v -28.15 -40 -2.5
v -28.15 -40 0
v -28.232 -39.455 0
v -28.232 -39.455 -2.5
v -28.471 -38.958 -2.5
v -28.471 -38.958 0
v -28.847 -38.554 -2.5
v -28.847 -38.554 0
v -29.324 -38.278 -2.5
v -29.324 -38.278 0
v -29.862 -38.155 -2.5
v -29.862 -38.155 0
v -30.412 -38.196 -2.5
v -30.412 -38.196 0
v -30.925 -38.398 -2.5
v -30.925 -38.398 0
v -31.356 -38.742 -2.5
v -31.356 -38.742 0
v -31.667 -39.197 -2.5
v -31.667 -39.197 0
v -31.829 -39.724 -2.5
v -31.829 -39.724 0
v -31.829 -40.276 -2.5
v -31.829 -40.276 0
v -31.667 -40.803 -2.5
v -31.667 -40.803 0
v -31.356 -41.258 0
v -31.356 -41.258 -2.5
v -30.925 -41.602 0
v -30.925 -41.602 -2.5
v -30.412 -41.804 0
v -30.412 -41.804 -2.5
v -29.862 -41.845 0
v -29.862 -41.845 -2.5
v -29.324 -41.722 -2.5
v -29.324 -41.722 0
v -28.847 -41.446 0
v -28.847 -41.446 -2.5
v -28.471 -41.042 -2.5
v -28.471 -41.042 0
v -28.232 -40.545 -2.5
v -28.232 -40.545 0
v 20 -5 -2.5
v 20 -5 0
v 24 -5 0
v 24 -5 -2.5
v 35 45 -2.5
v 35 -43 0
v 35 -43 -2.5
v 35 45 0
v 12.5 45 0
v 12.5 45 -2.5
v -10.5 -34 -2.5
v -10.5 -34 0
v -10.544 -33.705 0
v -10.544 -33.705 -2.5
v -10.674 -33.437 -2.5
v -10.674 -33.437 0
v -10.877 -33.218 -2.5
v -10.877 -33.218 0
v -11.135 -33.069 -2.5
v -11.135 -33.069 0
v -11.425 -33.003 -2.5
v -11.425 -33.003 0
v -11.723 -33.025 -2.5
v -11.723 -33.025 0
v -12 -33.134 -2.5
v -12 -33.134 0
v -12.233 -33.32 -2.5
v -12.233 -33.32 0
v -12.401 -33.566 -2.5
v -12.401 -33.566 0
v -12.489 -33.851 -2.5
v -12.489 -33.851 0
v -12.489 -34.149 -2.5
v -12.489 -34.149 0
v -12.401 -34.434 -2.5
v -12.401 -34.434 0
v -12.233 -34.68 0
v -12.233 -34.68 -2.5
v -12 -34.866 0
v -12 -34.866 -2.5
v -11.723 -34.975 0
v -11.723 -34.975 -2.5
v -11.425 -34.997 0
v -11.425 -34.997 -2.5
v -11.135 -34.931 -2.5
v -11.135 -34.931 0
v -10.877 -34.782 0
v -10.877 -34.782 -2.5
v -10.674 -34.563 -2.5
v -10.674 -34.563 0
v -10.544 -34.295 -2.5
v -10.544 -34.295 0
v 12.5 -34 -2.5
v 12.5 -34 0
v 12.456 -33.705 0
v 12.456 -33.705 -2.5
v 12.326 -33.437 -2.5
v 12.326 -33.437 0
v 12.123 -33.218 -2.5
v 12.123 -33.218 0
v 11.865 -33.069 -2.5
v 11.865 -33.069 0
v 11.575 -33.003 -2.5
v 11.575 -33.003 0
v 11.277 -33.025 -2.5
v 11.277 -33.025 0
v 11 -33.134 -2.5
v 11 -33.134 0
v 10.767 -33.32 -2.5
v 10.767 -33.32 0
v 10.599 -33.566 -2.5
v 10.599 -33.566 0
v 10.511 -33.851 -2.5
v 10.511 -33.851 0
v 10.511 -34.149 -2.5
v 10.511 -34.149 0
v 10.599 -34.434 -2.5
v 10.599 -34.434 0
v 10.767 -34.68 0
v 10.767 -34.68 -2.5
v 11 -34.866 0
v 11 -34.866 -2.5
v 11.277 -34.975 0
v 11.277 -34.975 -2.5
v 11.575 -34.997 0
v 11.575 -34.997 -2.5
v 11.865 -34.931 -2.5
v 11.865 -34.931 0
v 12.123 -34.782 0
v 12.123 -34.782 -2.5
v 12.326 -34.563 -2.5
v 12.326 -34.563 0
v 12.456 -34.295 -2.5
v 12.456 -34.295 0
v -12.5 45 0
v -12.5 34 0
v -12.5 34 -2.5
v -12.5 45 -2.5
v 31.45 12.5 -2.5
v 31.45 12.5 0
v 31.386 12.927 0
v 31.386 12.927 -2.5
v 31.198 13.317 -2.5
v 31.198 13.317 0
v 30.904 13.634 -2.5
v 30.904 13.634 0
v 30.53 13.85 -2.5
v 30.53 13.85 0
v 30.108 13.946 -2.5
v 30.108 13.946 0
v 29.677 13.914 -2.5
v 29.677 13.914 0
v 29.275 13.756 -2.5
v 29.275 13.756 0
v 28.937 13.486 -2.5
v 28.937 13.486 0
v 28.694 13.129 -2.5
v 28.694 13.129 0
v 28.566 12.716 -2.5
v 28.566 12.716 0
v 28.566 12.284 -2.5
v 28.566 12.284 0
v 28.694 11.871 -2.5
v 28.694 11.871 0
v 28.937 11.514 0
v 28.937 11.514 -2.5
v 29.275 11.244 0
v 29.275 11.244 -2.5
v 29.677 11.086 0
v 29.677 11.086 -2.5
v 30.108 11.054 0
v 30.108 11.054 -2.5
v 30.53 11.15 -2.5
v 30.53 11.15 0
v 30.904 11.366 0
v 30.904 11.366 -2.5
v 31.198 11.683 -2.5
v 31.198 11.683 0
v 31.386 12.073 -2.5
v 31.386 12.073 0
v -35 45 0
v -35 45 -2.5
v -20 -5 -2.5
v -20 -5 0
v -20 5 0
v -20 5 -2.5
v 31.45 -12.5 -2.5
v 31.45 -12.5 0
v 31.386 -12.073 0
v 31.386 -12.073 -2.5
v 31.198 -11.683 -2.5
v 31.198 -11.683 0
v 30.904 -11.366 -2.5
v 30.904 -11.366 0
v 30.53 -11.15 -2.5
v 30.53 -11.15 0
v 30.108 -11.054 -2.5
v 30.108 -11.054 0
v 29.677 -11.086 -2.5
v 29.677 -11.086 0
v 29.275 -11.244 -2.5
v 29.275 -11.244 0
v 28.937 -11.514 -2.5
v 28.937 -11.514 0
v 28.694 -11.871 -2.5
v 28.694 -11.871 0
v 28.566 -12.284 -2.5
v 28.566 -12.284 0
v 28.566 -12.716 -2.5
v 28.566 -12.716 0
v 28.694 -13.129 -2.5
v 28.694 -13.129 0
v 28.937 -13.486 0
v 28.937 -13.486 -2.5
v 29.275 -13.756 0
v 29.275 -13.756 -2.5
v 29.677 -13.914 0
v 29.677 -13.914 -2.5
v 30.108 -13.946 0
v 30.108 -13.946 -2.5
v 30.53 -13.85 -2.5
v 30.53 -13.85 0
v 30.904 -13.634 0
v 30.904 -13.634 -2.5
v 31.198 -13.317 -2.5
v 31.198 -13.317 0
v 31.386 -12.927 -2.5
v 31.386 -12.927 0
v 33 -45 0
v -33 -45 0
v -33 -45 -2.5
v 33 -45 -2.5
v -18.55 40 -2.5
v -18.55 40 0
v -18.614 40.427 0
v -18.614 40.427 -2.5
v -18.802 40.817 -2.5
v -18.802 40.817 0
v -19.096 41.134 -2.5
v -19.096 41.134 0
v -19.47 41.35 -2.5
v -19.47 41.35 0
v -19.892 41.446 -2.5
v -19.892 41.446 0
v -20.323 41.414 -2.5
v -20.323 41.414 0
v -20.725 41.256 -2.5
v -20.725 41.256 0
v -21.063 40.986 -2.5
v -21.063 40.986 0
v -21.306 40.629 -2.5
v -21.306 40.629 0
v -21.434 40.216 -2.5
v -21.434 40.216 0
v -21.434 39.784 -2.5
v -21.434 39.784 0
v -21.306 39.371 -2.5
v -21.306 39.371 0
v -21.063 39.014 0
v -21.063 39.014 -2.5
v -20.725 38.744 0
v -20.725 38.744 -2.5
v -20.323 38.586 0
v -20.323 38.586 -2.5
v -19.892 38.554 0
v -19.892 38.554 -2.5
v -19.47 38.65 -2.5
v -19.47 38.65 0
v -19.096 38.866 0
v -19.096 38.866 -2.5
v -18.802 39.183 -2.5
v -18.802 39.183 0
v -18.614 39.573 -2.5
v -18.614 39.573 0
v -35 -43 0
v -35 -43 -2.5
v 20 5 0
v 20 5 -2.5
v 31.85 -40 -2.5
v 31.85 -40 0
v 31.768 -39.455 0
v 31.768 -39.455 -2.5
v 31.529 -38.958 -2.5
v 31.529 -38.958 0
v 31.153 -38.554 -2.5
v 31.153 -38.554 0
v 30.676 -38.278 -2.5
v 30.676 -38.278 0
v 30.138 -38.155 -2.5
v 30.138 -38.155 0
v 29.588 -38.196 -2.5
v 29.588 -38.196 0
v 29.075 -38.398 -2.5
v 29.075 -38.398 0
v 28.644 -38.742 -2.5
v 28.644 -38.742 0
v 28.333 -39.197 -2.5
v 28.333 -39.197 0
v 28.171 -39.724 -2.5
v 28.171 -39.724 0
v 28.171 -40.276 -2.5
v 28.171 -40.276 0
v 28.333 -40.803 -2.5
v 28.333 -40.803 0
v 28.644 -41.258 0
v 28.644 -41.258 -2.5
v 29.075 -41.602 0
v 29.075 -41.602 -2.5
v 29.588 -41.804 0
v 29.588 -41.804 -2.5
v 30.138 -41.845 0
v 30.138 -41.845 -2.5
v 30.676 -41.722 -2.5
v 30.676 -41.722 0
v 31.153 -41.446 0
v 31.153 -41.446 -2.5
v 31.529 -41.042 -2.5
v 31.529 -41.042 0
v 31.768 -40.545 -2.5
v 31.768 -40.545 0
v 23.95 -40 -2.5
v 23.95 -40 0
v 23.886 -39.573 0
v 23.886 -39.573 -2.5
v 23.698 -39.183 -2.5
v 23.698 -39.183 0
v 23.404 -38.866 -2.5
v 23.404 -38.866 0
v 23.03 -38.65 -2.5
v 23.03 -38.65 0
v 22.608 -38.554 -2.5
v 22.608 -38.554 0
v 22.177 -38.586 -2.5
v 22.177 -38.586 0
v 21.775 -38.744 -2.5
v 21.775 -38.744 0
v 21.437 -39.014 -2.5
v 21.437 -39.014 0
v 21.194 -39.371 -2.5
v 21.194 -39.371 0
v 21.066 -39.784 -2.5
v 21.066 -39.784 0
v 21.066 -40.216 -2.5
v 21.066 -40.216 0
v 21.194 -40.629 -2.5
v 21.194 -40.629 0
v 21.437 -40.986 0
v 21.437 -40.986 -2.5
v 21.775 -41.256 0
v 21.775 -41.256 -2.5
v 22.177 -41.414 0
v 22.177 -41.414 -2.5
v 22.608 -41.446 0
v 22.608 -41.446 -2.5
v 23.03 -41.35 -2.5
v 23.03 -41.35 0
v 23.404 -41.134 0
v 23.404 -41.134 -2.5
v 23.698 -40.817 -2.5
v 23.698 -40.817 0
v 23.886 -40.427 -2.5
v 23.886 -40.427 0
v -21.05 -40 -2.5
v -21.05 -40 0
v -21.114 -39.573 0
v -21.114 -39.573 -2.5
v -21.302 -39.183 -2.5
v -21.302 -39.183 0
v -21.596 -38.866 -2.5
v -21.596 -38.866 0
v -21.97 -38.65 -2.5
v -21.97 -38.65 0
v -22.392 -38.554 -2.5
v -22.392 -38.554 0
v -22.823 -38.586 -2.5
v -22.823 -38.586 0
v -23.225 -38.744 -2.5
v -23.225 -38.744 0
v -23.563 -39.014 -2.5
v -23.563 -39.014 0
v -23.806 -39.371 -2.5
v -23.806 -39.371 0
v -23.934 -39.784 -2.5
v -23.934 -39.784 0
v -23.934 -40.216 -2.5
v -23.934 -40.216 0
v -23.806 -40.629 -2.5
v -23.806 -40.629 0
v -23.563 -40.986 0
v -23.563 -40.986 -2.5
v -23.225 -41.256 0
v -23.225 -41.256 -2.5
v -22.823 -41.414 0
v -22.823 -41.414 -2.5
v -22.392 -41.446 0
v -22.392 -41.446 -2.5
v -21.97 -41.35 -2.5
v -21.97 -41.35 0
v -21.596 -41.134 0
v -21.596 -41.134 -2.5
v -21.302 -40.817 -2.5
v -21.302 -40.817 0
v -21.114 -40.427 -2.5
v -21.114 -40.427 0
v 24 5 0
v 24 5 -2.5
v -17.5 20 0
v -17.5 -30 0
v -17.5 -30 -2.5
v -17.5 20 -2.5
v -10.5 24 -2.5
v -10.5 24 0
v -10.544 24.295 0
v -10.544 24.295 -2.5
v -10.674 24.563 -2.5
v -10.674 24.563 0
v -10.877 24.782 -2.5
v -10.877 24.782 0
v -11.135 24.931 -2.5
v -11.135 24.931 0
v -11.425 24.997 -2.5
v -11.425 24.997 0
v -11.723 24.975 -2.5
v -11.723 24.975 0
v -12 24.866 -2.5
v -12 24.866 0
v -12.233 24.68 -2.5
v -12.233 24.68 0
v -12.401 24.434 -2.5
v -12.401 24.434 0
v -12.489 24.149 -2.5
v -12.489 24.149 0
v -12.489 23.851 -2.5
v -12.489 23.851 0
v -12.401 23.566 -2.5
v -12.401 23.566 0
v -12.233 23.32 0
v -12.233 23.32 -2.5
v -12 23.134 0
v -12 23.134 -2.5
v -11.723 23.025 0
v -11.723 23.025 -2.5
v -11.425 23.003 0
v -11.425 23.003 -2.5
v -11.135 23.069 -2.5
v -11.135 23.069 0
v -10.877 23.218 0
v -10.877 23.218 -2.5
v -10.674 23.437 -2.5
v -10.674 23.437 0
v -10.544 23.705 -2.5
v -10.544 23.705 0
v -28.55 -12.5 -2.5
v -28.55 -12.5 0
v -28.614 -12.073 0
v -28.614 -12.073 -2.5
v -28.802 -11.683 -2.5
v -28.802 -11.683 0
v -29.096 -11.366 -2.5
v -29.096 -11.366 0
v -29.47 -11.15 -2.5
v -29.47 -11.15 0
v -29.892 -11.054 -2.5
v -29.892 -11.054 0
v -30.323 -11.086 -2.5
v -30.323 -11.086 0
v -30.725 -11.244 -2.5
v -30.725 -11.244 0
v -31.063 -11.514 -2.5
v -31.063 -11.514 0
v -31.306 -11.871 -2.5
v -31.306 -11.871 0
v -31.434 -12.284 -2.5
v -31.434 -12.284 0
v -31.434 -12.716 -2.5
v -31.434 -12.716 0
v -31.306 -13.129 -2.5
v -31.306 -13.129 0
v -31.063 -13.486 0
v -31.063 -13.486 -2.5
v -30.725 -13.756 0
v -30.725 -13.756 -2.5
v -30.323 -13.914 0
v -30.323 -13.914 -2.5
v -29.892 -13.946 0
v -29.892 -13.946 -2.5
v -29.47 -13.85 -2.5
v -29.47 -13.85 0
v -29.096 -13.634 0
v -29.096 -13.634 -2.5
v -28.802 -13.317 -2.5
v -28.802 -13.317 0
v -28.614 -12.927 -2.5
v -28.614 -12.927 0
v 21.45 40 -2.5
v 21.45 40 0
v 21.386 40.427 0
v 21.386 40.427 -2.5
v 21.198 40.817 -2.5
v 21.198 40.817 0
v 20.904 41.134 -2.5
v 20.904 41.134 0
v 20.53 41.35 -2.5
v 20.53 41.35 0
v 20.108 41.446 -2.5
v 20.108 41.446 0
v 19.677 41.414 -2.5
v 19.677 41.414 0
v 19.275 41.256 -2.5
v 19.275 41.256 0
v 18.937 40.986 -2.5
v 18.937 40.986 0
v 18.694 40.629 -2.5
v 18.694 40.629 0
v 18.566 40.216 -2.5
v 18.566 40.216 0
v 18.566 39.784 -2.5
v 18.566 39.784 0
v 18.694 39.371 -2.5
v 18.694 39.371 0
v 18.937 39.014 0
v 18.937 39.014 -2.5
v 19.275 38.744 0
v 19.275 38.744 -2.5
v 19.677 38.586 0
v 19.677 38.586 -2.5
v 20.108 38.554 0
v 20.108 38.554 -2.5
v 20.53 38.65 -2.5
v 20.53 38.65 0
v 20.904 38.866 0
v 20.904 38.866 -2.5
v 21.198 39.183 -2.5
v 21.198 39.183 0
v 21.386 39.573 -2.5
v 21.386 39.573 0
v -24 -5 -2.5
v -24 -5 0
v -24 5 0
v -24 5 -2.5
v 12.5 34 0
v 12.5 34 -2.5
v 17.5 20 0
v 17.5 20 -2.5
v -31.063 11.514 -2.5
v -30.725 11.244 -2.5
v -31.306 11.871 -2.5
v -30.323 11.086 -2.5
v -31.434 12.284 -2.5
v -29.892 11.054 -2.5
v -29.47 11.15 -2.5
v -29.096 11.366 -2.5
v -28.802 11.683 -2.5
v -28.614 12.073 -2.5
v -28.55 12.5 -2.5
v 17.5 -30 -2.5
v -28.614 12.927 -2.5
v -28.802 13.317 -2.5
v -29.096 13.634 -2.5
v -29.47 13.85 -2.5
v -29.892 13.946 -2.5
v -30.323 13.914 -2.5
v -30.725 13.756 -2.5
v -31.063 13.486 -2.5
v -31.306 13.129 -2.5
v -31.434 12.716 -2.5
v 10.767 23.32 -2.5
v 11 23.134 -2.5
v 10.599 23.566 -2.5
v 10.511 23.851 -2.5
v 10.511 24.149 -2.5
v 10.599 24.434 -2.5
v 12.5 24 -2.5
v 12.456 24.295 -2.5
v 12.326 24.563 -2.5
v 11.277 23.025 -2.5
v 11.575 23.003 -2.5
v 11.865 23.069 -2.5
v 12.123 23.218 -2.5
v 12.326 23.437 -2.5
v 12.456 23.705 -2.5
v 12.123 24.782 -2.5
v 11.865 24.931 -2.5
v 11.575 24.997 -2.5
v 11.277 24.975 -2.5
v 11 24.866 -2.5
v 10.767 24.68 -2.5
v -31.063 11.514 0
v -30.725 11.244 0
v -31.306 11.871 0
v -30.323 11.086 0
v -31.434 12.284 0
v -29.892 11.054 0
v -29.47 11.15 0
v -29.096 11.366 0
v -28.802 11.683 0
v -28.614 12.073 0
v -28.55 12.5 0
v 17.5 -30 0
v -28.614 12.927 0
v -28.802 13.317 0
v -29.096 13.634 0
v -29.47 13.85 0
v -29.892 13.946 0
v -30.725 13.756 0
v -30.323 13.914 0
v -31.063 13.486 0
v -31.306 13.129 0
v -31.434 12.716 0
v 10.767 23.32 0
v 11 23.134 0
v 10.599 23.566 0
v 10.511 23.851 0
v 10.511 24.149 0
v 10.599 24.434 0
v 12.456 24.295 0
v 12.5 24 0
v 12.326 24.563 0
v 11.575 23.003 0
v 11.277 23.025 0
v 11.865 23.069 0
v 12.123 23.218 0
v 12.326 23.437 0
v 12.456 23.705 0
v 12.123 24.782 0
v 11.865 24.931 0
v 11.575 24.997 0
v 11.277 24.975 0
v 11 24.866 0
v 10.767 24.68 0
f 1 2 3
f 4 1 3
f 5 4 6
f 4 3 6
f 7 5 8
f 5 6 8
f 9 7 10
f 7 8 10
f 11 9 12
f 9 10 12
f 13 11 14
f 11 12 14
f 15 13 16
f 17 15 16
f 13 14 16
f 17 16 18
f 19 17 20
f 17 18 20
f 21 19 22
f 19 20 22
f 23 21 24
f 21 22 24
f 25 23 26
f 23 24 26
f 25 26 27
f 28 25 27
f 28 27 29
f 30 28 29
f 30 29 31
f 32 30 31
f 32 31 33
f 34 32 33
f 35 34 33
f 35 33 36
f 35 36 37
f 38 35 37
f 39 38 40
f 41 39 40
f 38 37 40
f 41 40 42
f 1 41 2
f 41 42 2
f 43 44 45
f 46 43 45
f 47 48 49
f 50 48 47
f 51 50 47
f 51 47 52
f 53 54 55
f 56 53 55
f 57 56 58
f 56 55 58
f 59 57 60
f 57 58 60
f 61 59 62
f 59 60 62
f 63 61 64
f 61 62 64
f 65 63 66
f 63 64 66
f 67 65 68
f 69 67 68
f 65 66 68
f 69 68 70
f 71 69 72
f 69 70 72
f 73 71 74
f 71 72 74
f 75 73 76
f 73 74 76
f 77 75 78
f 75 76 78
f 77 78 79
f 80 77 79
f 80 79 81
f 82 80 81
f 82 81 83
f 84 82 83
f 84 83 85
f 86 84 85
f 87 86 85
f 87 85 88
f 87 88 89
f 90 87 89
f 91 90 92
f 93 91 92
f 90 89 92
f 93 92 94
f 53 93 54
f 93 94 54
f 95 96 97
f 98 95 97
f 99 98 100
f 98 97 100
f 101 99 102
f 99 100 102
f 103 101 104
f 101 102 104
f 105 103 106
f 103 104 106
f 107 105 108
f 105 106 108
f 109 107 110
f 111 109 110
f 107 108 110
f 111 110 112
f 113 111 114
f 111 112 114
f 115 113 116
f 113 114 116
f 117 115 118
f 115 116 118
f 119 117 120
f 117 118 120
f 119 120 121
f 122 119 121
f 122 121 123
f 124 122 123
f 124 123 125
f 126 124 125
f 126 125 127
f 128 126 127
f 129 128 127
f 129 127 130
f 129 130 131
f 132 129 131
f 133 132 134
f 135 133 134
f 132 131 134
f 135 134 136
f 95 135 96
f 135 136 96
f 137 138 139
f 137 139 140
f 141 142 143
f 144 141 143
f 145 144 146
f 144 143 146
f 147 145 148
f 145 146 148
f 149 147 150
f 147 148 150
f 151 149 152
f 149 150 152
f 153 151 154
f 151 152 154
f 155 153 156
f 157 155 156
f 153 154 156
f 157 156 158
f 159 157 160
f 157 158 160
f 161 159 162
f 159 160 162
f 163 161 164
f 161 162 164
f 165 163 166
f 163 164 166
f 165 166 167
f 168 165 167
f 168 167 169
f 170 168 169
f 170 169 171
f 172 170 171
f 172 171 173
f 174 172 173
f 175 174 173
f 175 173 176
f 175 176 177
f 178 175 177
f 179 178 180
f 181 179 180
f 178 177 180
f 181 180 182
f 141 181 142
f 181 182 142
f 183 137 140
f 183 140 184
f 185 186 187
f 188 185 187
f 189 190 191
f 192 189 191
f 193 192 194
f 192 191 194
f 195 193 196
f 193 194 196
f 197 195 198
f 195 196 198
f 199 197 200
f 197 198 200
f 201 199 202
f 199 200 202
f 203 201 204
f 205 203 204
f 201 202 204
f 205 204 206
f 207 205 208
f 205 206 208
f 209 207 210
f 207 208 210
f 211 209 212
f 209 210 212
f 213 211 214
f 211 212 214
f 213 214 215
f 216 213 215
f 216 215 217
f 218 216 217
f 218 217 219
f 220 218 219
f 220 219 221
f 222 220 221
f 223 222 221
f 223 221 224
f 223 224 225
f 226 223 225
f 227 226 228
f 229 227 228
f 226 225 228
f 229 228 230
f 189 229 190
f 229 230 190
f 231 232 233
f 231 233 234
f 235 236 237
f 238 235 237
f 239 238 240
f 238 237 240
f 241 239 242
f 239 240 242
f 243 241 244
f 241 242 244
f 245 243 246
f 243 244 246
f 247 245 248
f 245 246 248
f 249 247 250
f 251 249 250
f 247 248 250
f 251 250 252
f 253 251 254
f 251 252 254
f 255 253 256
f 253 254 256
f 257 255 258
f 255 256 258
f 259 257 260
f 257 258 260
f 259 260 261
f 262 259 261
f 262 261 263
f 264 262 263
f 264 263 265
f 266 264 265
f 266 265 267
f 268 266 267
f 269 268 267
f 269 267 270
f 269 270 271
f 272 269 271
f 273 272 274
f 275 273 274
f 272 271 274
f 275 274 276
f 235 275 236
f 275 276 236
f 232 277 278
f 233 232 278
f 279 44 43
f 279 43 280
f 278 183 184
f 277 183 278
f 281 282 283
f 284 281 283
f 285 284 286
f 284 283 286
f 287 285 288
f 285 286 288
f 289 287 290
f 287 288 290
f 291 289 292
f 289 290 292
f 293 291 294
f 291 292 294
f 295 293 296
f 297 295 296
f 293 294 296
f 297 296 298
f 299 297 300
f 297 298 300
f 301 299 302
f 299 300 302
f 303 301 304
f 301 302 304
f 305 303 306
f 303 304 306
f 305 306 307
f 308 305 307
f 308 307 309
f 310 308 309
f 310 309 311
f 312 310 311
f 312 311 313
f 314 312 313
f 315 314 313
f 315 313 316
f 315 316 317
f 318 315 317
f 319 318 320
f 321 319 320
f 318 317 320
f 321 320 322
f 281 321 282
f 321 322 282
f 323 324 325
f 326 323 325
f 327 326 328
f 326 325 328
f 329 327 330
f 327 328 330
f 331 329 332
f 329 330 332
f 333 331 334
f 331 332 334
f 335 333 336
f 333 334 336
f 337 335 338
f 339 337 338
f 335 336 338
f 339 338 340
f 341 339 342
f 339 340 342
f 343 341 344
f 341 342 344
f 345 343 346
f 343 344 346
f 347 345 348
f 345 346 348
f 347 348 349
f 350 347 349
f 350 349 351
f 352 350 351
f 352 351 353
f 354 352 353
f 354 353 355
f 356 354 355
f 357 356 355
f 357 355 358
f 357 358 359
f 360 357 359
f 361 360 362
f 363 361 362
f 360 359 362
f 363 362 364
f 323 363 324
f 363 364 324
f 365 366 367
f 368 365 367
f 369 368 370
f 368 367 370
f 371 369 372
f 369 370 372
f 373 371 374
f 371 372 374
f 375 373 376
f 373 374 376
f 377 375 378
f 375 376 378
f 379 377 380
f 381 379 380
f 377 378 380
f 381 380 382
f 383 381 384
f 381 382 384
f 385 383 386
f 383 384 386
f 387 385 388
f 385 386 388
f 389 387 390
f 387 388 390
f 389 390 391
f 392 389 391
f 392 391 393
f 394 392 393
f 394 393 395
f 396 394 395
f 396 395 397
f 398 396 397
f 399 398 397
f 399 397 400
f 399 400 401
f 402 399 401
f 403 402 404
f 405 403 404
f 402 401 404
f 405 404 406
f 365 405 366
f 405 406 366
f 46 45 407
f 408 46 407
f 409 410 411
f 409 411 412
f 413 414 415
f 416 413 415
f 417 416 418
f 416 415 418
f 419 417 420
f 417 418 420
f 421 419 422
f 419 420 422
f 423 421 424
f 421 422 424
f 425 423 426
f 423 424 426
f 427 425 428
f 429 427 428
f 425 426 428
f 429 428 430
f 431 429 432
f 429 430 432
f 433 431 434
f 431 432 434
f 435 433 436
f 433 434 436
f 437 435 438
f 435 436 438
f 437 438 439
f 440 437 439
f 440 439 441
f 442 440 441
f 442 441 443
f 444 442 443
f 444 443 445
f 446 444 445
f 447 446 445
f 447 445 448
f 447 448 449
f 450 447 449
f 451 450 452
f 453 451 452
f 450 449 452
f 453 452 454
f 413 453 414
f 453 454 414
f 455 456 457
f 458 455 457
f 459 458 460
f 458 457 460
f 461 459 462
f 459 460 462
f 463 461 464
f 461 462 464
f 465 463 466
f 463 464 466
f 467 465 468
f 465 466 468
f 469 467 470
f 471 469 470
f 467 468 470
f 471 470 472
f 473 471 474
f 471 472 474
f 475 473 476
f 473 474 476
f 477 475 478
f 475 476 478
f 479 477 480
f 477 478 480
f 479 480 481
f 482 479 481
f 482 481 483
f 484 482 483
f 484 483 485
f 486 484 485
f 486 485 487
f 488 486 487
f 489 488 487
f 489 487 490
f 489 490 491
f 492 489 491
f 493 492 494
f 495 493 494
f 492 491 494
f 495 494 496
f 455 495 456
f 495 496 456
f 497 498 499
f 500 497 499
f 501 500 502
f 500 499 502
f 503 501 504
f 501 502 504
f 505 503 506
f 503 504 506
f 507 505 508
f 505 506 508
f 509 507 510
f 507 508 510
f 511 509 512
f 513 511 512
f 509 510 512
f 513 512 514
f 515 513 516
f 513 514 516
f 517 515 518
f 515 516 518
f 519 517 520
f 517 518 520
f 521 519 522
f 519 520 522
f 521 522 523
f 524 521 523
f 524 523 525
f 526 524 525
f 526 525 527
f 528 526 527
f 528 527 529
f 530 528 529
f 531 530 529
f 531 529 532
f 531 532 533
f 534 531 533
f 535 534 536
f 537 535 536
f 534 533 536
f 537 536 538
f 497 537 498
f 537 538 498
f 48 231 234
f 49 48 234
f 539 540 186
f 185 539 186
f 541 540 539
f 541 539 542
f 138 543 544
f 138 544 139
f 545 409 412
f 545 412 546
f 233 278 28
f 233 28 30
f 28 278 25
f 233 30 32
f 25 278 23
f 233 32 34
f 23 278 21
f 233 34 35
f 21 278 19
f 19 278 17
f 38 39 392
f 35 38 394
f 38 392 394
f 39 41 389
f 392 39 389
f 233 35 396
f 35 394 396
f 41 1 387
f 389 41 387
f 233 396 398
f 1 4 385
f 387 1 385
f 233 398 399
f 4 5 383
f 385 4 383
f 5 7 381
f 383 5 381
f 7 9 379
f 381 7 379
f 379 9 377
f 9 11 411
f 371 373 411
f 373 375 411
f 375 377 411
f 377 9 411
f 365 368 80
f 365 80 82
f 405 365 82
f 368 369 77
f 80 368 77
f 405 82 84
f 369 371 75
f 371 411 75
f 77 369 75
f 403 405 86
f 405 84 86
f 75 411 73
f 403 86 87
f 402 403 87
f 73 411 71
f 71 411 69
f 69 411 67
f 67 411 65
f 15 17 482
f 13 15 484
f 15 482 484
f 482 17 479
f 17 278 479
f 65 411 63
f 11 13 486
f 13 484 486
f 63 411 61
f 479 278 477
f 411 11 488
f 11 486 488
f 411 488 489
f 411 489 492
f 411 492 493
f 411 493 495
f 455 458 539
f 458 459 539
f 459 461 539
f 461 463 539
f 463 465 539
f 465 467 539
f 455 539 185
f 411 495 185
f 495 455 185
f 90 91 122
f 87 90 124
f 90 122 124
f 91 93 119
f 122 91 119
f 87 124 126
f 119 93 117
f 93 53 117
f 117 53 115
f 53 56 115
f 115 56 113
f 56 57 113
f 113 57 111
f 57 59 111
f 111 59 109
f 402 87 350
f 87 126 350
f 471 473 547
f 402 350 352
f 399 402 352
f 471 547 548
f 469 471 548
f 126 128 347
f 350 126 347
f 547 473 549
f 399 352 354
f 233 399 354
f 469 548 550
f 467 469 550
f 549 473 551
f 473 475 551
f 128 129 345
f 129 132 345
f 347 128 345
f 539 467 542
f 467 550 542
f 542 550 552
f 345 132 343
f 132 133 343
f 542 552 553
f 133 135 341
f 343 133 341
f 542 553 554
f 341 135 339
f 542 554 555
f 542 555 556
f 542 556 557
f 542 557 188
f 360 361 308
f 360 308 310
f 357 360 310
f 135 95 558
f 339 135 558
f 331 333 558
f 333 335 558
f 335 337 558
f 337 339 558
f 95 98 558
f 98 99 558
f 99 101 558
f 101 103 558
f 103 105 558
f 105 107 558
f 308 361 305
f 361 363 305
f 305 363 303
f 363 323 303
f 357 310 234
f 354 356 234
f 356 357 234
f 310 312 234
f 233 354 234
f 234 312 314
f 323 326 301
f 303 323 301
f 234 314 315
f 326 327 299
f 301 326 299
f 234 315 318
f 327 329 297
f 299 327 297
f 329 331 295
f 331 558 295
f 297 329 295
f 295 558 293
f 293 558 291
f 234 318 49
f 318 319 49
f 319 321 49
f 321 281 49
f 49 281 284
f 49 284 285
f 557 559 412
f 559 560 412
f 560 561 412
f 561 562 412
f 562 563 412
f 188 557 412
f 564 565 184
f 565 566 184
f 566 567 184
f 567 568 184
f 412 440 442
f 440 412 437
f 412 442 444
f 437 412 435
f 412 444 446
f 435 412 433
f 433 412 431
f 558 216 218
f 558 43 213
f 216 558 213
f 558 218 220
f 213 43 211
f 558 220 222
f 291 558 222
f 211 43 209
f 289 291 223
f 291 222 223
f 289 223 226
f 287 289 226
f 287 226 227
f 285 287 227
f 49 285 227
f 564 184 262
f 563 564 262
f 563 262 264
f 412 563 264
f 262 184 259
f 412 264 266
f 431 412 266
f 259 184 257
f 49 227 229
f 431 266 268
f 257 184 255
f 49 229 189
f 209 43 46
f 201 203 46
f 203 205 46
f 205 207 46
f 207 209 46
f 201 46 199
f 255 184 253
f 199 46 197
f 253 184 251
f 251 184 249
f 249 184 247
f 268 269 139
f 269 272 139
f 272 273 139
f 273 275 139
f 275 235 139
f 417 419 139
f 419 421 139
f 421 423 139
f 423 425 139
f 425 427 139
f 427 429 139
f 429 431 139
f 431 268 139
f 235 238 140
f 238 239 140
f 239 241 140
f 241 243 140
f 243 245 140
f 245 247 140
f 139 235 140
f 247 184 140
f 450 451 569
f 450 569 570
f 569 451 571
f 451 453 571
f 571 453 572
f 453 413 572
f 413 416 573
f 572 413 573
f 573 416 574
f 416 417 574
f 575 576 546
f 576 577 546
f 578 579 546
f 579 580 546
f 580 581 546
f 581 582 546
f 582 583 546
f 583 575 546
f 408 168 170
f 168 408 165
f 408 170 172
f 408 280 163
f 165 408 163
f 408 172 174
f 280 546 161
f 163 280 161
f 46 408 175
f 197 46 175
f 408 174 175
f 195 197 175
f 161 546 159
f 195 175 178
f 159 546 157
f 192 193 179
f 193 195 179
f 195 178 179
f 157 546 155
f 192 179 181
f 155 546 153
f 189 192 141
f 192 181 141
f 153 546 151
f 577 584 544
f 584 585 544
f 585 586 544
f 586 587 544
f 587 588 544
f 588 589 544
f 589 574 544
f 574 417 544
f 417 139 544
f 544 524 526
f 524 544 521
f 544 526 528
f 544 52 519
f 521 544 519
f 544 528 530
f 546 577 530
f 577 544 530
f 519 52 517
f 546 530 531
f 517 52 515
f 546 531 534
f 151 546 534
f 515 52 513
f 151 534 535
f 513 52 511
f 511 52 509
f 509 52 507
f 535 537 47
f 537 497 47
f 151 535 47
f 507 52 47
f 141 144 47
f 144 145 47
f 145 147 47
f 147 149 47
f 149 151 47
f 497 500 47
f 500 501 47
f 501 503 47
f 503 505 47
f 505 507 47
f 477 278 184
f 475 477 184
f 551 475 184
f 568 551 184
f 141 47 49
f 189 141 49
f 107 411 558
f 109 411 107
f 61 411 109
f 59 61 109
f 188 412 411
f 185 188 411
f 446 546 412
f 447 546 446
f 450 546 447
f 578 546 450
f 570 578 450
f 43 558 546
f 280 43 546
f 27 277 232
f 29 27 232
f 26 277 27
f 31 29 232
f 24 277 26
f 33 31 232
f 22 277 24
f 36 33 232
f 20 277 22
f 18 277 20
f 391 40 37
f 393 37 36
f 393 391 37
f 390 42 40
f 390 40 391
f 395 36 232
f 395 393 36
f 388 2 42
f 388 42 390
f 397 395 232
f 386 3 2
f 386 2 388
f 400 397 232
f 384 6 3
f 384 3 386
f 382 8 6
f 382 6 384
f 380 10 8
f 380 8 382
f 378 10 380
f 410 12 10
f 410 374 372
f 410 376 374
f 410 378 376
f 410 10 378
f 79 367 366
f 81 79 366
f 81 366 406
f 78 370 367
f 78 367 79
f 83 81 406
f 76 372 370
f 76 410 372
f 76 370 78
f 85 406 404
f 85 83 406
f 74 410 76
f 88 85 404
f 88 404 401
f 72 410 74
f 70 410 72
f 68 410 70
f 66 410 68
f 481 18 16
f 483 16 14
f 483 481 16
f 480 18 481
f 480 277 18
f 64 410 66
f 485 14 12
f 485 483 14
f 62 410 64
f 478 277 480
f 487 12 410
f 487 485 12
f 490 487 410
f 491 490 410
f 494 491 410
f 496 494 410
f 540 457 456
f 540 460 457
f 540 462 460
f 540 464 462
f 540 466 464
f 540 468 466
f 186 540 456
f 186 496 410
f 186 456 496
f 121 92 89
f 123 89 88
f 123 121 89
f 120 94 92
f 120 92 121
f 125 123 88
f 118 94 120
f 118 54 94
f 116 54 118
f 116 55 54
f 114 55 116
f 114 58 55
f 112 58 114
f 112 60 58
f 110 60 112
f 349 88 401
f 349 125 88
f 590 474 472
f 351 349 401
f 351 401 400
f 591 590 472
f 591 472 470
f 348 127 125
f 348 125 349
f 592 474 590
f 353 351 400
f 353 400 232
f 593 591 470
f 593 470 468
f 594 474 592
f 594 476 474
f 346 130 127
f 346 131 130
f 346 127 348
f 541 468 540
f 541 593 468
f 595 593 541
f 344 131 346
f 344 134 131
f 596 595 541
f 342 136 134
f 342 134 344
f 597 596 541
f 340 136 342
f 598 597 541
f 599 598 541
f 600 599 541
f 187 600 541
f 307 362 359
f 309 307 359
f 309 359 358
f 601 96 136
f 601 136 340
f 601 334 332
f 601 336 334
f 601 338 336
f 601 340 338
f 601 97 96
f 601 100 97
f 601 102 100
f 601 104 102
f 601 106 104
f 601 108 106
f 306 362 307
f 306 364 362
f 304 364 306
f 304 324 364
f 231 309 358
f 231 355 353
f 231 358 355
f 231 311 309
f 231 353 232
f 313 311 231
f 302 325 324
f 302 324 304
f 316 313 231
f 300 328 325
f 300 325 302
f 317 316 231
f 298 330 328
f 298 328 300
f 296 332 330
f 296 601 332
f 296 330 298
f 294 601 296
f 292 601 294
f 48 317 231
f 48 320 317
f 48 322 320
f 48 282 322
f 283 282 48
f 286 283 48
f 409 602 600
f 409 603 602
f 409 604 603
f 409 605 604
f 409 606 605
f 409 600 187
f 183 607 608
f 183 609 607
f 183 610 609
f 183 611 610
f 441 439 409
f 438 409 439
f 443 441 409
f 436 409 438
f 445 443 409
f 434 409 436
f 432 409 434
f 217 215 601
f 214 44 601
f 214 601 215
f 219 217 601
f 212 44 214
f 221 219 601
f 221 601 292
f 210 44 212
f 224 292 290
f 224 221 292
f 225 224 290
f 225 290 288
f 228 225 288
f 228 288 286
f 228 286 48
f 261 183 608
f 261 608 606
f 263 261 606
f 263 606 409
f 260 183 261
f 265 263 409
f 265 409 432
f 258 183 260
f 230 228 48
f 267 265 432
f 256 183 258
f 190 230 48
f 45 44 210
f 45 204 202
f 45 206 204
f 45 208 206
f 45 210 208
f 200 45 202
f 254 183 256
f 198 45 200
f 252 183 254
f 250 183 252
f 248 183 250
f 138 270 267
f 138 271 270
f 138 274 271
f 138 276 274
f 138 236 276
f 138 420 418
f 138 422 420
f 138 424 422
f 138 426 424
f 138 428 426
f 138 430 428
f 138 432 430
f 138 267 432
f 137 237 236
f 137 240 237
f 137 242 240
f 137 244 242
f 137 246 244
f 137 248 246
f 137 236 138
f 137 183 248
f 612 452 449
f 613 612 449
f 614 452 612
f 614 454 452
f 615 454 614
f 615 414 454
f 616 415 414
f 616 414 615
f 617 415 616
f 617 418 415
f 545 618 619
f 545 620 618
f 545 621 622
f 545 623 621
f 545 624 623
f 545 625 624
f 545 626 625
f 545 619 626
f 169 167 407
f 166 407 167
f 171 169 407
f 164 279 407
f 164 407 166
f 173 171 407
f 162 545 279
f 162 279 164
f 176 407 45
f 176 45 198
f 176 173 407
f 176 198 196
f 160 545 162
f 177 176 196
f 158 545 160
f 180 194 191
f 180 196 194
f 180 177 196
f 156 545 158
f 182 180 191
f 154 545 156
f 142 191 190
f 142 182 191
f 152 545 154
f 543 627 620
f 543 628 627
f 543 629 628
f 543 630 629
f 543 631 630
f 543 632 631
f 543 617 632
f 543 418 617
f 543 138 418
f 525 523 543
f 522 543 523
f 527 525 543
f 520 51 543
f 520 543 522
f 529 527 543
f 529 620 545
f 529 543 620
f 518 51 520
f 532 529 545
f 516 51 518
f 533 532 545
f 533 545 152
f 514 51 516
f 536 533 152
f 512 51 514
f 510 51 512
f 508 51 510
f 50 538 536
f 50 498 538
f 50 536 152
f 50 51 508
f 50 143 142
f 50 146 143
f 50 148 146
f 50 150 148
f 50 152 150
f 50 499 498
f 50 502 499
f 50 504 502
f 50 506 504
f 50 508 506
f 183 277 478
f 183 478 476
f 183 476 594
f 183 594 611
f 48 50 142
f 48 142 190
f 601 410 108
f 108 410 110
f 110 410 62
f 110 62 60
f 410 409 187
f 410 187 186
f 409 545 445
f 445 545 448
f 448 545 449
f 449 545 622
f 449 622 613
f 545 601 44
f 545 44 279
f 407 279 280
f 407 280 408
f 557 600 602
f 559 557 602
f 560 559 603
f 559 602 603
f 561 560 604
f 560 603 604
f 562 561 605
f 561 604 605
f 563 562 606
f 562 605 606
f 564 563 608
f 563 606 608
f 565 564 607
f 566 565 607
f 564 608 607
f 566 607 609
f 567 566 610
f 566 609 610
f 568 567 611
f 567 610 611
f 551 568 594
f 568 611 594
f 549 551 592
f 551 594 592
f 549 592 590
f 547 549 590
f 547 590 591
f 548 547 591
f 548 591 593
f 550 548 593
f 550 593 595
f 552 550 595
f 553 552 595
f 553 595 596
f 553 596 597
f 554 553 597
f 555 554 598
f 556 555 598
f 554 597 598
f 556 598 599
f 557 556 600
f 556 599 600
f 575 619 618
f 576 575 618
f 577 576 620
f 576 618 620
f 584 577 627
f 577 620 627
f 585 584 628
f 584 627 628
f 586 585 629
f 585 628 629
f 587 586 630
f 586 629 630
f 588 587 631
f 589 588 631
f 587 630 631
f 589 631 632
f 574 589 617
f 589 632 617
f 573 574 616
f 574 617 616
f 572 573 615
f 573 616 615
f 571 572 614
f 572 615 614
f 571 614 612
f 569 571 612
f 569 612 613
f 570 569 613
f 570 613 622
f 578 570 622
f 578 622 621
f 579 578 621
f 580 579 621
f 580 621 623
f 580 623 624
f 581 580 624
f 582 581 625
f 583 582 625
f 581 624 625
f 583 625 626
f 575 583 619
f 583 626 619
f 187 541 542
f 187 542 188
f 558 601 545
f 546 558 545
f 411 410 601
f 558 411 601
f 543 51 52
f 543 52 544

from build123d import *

# Parameters (mm, degrees)
F0_R     = 1.85
F0_R_2   = 1.45
F0_R_3   = 1
F0_W     = 35
F0_H     = 50
F0_W_2   = 4
F0_H_2   = 10
F1_DEPTH = 2.5
F2_SIZE  = 2


# Not quite as in the source:
# - a feature names something its author has since deleted; it is built from what else it names


with BuildPart() as f1:
    # F0 (on Top) → F1 (new body)
    with BuildSketch(Plane.XY):
        Polygon((-12.5, 45), (-35, 45), (-35, -45), (35, -45), (35, 45), (12.5, 45), (12.5, 34), (-12.5, 34), align=None)
        with Locations((-30, -40)):
            Circle(F0_R, mode=Mode.SUBTRACT)
        with Locations((-22.5, -40)):
            Circle(F0_R_2, mode=Mode.SUBTRACT)
        with Locations((-11.5, -34)):
            Circle(F0_R_3, mode=Mode.SUBTRACT)
        with Locations((-30, -12.5)):
            Circle(F0_R_2, mode=Mode.SUBTRACT)
        with Locations((11.5, -34)):
            Circle(F0_R_3, mode=Mode.SUBTRACT)
        with Locations((22.5, -40)):
            Circle(F0_R_2, mode=Mode.SUBTRACT)
        with Locations((30, -40)):
            Circle(F0_R, mode=Mode.SUBTRACT)
        with Locations((0, -5)):
            Rectangle(F0_W, F0_H, mode=Mode.SUBTRACT)
        with Locations((30, -12.5)):
            Circle(F0_R_2, mode=Mode.SUBTRACT)
        with Locations((-22, 0)):
            Rectangle(F0_W_2, F0_H_2, mode=Mode.SUBTRACT)
        with Locations((-30, 12.5)):
            Circle(F0_R_2, mode=Mode.SUBTRACT)
        with Locations((-20, 40)):
            Circle(F0_R_2, mode=Mode.SUBTRACT)
        with Locations((-11.5, 24)):
            Circle(F0_R_3, mode=Mode.SUBTRACT)
        with Locations((22, 0)):
            Rectangle(F0_W_2, F0_H_2, mode=Mode.SUBTRACT)
        with Locations((30, 12.5)):
            Circle(F0_R_2, mode=Mode.SUBTRACT)
        with Locations((11.5, 24)):
            Circle(F0_R_3, mode=Mode.SUBTRACT)
        with Locations((20, 40)):
            Circle(F0_R_2, mode=Mode.SUBTRACT)
    extrude(amount=-F1_DEPTH)

    # F2
    f2_edges = [f1.edges().sort_by_distance(p)[0] for p in [
        (-35, -45, -1.25),
        (35, -45, -1.25),
    ]]
    chamfer(f2_edges, length=F2_SIZE)


solid = f1.part
